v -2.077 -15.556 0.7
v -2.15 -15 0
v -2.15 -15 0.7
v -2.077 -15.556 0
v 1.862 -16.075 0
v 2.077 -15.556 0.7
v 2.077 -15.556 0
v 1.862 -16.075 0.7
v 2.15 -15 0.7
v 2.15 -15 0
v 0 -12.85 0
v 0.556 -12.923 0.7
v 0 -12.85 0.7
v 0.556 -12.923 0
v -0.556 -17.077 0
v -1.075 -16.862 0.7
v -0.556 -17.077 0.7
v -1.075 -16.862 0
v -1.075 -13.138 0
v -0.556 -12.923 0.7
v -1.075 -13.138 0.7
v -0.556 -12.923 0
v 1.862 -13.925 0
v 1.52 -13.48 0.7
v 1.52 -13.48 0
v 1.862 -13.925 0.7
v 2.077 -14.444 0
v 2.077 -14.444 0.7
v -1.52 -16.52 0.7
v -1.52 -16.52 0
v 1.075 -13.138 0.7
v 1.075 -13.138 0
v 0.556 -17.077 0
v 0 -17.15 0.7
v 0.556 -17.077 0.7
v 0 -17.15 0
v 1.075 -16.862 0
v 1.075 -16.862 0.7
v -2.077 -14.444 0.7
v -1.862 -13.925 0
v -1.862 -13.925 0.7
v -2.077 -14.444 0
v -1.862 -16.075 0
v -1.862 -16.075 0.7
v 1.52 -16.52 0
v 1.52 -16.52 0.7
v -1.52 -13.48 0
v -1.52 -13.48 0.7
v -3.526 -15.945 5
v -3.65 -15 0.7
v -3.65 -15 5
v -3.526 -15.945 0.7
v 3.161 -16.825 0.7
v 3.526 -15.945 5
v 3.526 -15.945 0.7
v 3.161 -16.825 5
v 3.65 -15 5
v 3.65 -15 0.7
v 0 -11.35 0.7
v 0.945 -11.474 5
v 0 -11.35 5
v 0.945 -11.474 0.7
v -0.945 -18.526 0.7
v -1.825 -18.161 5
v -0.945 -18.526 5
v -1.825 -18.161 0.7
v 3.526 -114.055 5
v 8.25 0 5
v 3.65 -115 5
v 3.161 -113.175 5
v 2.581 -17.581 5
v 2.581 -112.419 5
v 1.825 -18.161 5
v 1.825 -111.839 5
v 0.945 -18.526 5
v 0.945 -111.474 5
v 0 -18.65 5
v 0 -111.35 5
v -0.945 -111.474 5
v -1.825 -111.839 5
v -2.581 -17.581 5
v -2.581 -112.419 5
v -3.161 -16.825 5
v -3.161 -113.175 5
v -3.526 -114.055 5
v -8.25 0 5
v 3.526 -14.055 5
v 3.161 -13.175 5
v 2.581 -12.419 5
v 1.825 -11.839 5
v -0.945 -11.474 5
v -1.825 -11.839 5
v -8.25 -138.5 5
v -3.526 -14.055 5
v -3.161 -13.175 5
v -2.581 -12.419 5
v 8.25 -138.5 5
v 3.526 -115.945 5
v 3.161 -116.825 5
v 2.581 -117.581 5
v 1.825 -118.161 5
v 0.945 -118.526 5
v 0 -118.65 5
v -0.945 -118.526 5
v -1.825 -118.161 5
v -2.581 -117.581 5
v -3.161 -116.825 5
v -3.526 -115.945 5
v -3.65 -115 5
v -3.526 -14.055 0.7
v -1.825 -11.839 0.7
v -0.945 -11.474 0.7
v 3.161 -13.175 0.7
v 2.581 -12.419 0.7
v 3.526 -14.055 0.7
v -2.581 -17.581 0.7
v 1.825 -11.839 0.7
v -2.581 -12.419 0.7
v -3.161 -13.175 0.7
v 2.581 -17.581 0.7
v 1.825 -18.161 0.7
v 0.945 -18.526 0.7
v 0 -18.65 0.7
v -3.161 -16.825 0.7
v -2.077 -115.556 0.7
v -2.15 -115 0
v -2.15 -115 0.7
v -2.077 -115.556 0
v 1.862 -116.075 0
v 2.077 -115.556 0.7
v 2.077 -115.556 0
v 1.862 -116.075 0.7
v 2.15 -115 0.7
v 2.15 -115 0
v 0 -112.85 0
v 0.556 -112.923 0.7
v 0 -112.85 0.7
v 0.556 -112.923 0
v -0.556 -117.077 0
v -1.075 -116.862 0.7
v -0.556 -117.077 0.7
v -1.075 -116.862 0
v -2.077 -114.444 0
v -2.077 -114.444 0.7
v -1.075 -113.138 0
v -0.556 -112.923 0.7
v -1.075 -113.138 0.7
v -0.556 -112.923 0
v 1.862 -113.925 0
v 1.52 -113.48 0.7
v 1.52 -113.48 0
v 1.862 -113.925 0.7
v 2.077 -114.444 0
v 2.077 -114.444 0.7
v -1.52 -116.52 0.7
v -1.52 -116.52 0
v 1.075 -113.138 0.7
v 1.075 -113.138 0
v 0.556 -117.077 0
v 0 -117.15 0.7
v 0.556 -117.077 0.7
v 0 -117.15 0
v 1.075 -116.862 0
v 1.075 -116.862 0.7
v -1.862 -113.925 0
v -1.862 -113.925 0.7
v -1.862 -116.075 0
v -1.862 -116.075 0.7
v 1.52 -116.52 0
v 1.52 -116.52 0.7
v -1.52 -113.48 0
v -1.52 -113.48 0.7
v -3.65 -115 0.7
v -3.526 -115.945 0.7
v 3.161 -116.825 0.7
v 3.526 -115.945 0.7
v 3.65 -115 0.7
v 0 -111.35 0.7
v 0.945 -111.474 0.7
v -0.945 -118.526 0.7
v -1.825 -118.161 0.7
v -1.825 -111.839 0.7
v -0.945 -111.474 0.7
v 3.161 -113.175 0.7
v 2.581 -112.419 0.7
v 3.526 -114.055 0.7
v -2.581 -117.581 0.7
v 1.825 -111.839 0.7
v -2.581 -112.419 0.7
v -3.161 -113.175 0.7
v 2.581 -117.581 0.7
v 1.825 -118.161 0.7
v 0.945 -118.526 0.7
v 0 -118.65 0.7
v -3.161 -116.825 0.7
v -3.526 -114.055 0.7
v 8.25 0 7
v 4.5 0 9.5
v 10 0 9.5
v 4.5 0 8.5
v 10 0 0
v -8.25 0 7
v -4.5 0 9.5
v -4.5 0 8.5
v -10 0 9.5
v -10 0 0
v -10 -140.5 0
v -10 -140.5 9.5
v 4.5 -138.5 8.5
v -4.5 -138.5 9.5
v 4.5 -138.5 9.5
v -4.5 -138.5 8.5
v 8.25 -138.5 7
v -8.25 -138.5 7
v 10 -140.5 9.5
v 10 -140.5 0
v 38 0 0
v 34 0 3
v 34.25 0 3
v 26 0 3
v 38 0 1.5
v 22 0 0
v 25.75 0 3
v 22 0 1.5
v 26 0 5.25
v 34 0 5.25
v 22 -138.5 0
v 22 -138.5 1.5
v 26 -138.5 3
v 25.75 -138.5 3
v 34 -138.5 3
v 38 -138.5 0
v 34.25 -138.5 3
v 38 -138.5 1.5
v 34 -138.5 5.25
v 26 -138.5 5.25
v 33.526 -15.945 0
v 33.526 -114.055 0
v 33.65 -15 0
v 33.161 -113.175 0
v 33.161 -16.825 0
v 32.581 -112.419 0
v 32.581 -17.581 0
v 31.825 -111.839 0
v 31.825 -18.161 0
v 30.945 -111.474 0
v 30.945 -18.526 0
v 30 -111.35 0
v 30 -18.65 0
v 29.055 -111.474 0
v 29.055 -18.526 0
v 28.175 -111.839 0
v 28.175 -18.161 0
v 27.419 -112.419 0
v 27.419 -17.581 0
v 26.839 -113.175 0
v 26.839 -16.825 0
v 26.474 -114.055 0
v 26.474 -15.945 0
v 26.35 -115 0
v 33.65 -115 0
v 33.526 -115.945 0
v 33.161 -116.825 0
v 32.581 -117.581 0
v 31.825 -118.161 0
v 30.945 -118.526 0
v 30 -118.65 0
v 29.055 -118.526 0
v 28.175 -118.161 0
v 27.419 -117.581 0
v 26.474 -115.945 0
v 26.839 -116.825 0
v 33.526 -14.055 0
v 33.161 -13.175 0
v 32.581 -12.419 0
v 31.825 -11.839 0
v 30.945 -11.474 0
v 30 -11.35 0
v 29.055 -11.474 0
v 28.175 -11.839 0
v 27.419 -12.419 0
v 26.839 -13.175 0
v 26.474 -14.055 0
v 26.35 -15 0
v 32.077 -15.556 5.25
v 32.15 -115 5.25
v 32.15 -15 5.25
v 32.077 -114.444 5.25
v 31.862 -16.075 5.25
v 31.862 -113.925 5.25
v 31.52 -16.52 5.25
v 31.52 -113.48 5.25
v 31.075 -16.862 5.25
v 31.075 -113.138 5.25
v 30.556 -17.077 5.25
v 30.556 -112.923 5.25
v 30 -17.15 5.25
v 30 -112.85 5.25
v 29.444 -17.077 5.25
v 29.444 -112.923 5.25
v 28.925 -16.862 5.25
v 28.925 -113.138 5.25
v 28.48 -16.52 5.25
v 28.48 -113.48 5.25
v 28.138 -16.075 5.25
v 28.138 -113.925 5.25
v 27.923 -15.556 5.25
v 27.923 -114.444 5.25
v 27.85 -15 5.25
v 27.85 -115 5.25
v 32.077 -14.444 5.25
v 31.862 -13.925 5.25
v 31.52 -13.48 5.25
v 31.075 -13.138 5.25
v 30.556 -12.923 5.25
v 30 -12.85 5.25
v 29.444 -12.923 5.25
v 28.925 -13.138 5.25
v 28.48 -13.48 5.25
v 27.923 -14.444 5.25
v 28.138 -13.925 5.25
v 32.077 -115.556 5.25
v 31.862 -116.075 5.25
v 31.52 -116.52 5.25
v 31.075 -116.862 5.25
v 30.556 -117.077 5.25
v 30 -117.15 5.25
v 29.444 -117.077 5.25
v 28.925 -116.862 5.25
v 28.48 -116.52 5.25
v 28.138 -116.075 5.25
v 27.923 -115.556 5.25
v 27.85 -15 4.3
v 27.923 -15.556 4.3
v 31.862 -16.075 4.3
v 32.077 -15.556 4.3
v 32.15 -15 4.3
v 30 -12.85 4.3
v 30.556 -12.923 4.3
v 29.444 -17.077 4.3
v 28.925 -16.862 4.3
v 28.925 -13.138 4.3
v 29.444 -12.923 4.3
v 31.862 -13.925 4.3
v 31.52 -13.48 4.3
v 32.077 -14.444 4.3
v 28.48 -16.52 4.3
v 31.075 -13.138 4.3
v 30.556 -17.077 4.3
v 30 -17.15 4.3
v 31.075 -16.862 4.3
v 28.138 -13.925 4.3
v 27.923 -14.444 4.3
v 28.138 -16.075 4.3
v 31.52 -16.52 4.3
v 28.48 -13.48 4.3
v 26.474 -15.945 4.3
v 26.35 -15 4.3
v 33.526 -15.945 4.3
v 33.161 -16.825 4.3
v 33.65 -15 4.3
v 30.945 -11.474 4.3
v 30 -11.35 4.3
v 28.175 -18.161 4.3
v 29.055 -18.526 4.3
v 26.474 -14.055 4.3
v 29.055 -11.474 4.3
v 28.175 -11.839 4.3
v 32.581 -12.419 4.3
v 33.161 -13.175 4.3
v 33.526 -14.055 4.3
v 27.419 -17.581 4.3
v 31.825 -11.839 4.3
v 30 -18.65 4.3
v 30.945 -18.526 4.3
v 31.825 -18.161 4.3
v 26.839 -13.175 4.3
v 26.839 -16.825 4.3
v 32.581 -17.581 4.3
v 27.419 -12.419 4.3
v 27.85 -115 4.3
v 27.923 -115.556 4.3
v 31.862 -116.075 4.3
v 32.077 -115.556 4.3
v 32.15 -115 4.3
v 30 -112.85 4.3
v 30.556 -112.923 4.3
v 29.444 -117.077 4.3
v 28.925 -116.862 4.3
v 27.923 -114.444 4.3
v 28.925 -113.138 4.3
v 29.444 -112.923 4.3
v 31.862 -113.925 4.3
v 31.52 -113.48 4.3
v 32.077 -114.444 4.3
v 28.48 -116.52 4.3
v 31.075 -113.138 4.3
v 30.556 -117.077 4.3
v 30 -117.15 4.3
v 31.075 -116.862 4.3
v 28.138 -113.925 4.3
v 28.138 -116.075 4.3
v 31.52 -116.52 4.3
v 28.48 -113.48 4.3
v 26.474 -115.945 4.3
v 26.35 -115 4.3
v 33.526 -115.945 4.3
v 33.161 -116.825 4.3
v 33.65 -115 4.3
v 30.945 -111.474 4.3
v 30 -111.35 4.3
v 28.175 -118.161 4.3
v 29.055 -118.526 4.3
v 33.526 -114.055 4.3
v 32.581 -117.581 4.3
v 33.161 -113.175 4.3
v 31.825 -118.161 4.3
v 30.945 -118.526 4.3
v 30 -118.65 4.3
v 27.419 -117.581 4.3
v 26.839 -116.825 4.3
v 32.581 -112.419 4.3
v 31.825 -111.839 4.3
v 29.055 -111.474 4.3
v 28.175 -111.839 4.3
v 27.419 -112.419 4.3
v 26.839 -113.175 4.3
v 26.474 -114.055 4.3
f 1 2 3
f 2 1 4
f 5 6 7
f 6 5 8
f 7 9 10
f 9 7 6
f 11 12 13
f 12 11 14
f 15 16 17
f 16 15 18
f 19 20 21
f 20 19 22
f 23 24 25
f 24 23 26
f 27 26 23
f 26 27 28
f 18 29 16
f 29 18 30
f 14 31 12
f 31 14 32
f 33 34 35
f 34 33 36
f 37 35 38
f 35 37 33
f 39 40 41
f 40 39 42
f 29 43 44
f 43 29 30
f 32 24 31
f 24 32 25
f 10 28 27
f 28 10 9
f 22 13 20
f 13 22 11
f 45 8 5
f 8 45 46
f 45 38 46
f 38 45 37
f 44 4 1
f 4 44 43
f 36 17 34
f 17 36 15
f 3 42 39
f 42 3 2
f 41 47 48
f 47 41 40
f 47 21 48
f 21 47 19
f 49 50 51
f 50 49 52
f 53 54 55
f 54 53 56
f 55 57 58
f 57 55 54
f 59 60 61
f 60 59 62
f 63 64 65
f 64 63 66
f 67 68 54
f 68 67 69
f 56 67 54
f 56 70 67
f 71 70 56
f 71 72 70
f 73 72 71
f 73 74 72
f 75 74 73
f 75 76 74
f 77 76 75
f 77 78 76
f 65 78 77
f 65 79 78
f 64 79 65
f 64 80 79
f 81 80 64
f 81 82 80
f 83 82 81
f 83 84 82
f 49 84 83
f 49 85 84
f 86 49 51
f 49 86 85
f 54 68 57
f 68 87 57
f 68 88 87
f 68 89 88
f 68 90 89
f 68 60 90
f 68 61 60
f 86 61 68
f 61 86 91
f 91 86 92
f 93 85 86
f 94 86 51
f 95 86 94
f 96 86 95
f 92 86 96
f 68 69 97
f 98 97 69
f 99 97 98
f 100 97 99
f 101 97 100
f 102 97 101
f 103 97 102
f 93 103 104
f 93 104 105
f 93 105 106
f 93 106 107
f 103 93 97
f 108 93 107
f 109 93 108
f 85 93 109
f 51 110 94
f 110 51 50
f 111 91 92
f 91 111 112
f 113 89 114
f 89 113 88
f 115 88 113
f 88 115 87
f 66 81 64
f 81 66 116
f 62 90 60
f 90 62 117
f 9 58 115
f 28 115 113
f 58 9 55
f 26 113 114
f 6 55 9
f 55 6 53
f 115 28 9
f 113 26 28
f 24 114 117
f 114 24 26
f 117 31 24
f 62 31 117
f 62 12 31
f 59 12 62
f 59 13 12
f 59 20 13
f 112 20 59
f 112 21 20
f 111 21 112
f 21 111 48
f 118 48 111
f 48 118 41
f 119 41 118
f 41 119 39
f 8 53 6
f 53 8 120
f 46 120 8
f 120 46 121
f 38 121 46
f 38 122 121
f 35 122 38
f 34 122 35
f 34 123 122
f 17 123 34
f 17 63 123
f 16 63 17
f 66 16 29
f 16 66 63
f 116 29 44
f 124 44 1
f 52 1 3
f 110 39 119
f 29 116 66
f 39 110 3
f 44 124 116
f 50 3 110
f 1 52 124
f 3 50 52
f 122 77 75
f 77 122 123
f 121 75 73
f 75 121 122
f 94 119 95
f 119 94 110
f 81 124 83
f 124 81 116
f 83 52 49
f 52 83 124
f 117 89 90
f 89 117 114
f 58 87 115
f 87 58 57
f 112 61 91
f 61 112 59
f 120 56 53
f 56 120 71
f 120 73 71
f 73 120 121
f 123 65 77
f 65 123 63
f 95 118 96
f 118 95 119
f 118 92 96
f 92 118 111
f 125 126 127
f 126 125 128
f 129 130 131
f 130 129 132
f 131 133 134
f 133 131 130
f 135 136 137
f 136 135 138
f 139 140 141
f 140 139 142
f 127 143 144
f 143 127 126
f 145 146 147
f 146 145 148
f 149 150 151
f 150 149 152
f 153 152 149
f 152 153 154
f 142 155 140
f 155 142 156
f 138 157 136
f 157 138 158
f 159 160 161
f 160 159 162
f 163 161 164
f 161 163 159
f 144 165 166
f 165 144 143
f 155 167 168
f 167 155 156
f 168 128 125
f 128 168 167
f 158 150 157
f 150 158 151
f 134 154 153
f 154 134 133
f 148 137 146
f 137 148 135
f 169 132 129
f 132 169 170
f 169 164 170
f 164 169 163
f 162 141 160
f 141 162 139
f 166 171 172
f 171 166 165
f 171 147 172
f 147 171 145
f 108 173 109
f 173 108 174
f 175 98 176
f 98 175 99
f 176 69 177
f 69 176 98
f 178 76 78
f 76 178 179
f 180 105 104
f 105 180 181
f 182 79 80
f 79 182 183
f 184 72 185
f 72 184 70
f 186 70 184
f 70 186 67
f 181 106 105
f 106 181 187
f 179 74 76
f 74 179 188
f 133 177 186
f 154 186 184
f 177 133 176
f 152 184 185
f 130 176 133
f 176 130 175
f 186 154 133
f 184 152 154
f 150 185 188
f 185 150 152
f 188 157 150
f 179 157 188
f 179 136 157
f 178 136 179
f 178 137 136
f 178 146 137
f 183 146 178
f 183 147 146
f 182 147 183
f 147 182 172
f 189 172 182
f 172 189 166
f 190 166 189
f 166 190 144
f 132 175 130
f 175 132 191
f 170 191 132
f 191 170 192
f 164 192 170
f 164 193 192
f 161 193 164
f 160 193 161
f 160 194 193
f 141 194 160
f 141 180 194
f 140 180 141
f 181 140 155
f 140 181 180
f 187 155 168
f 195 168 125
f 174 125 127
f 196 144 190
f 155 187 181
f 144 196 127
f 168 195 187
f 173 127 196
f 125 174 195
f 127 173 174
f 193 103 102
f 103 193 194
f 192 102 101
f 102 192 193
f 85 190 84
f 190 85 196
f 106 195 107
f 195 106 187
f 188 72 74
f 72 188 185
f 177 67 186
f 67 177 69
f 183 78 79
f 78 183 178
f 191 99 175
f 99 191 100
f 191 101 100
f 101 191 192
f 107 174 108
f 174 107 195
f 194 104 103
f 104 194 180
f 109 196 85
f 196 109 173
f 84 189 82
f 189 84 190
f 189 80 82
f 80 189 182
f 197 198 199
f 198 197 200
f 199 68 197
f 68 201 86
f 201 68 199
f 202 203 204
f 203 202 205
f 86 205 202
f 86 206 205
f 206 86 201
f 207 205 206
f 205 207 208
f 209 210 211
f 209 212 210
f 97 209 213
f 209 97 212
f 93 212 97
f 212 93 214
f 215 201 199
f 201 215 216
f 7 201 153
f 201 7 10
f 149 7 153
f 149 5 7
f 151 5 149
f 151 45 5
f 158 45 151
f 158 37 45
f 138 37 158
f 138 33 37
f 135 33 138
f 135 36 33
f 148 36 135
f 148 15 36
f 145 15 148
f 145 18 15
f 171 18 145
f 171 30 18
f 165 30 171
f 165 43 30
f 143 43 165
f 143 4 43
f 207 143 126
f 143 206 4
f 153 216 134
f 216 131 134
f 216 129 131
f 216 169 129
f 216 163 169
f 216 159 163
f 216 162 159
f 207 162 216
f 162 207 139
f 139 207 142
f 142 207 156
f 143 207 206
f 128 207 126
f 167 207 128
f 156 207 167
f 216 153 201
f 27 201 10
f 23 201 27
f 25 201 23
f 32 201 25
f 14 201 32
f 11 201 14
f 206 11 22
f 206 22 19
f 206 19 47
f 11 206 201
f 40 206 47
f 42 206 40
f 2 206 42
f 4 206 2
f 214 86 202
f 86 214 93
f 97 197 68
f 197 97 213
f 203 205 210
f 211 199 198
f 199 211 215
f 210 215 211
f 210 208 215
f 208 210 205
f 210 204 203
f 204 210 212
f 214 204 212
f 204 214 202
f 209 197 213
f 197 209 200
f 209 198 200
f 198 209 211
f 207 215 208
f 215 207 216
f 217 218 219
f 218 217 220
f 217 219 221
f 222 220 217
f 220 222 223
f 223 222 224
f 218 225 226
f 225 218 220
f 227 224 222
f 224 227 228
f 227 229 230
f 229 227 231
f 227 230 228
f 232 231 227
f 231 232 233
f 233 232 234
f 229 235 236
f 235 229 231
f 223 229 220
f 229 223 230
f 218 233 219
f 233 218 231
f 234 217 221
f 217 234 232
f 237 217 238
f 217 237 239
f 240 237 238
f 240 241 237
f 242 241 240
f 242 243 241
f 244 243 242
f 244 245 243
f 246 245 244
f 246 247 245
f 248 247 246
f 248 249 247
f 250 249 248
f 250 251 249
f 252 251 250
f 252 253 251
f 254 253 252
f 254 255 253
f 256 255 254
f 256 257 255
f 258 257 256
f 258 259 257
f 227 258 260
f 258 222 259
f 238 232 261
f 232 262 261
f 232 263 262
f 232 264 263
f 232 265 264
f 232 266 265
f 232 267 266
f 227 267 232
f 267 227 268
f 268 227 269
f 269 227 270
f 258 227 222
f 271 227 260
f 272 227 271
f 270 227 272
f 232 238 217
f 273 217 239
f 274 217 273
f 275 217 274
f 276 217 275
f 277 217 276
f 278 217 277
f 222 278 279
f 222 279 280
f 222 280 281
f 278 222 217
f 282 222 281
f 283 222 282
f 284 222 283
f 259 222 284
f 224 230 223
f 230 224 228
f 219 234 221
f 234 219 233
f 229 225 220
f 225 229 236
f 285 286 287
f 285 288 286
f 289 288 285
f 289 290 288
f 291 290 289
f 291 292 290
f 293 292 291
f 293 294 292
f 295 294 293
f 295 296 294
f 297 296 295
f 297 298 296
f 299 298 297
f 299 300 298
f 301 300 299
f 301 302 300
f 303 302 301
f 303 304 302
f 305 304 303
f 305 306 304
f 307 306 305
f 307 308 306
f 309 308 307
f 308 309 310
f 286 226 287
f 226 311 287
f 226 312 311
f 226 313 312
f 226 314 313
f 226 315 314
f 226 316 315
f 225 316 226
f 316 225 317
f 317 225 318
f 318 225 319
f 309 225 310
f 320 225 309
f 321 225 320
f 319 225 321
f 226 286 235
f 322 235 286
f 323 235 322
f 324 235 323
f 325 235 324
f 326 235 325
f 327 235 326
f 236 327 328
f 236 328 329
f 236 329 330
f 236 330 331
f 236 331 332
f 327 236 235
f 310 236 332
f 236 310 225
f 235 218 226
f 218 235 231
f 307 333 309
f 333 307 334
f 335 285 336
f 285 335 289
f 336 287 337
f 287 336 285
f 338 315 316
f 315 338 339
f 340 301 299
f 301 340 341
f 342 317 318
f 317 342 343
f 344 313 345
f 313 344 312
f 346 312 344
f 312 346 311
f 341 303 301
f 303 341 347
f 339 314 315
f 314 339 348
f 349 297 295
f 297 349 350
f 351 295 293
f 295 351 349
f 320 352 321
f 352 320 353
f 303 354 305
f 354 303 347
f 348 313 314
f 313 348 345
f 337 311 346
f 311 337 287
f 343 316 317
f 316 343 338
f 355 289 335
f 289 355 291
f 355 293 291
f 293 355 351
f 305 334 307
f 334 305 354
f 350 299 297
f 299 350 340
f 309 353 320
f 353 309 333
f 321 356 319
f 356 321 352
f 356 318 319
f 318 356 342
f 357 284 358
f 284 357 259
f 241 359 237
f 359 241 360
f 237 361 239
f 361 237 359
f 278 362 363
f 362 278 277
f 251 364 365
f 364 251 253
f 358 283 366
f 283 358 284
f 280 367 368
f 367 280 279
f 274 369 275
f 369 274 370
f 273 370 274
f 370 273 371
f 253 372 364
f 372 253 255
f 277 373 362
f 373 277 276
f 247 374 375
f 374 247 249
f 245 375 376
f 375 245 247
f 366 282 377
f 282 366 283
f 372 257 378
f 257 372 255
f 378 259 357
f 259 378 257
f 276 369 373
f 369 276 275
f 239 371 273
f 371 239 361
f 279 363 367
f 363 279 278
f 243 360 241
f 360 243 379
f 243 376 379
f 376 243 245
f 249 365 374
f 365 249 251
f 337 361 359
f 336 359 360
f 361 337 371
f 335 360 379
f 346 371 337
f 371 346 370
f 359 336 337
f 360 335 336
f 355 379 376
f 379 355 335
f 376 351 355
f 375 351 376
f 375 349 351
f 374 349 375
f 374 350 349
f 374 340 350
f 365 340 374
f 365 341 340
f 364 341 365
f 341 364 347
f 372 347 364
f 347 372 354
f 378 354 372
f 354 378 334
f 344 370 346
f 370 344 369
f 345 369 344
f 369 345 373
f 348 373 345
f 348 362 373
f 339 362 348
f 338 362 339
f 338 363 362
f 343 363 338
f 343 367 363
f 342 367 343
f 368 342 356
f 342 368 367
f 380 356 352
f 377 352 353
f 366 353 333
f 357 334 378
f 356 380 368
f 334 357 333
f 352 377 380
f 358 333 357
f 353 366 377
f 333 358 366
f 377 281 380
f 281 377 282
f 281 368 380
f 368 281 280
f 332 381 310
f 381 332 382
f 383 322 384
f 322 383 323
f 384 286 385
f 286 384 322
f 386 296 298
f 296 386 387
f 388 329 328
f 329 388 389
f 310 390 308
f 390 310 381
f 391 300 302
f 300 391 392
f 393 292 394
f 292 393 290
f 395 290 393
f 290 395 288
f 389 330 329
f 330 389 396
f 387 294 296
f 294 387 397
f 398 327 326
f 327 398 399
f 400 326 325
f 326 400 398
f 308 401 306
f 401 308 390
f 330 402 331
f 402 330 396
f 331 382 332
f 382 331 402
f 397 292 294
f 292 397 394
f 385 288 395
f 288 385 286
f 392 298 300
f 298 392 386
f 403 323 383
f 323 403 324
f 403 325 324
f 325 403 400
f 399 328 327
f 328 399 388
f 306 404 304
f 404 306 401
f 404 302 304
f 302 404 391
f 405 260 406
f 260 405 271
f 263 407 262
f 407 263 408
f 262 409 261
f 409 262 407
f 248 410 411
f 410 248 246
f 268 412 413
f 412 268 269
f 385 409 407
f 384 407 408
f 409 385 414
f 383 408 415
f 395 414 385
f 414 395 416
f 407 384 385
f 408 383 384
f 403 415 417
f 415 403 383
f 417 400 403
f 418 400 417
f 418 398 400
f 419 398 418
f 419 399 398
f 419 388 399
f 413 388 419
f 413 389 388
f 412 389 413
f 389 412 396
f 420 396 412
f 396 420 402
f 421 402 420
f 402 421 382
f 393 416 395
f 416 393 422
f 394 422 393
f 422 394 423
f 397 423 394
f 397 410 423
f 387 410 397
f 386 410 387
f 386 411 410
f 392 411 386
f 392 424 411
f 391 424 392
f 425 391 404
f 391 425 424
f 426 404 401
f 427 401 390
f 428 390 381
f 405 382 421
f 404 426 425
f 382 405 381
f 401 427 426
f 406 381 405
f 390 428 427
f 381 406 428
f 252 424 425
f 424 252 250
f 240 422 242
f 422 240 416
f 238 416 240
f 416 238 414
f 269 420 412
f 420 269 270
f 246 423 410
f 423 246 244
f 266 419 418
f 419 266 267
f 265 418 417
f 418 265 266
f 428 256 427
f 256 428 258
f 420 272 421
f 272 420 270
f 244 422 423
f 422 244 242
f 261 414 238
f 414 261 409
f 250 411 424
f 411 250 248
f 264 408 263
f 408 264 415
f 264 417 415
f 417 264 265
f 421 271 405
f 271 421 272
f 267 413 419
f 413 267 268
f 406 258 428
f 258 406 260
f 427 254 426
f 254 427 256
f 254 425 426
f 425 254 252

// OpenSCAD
// Rails for Optimus Control Box 3D printer assembly (delta configuration)

/**********************/
/*    Parameters      */
/**********************/

Test_Mode = false;  // use Test_Mode true to print a short rail for testing

Length = Test_Mode ? 20 : 138.5; // this length should fit the optimus control box
Width = 20; // the outer width of the rail
Width_Inner = 16; // the inner width of the rail
Height_Base = 5;
Height_Rail_Base = 3;
Height_Rail_Upper = 2.5;
Distance = 30; // distance between parts

Hole_Tolerance = 0.3; // 0.3 should work fine for the holes to fit the screws
Slide_Tolerance = 0.5; // try slide tolerance values between 0.1 and 0.8, depending on your printer settings and material used
Bevel_Distance = 2; // a larger value means a lower angle

/**********************/
/*     Variables      */
/**********************/

Rail_Length = Length;
Rail_Base_Width = Width_Inner;
Rail_Base_Height = Height_Rail_Base;
Rail_Base_Bevel_Distance = Bevel_Distance;
Rail_Upper_Width = 8;
Rail_Upper_Height = Height_Rail_Upper;
Rail_Height = Rail_Base_Height + Rail_Upper_Height;

Slide_Move = 0;
Slide_Length = Length;
Slide_Width = Width;
Slide_Base_Height = Height_Base;
Slide_Space_Height = Rail_Base_Height + Slide_Tolerance;
Slide_Space_Wall_Width = (Width - Rail_Base_Width - Slide_Tolerance) / 2;
Slide_Space_Width = Slide_Width - 2 * Slide_Space_Wall_Width;
Slide_Overhang_Height = 1;
Slide_Overhang_Bevel_Distance = Bevel_Distance; //distance between base and bottom corner of the bevel
Slide_Overhang_Width = (Slide_Width - Rail_Upper_Width)/ 2 - Slide_Tolerance;
Slide_Height = Slide_Base_Height + Slide_Space_Height + Slide_Overhang_Height;
Slide_Stop_Thickness = 2;

Hole_Diameter = 4 + Hole_Tolerance;
Hole_Distance = 100;
Hole_Start_Distance = 15;
Hole_Buffer = 5;
Hole_Lowering_Diameter = 7 + Hole_Tolerance;
Hole_Lowering_Height = 4 + Hole_Tolerance;

/**********************/
/*    Code Start      */
/**********************/

Slide();
Rail();

/**********************/
/*       SLIDE        */
/**********************/

module Slide() {
    color("red") {
        translate([Slide_Move, 0, 0])
            union() {
                translate([0, 0, Slide_Base_Height / 2])
                    rotate([90,0,0])
                        SlideBase();
                translate([0, 0, Slide_Base_Height + Slide_Space_Height / 2])
                    rotate([90,0,0])
                        SlideSpacePart();
                translate([0, 0, Slide_Base_Height + Slide_Space_Height + Slide_Overhang_Height / 2])
                    rotate([90,0,0])
                        SlideOverhangPart();
                translate([0, -Slide_Length, Slide_Height / 2])
                    rotate([90,0,0])
                        SlideStop();
            }
    }
}

module SlideBase() {
    difference() {
        SlideBaseBlock();
        SlideBaseHoles();
    }
}

module SlideBaseBlock() {
    linear_extrude(height = Slide_Length)
        square([Slide_Width, Slide_Base_Height], center = true);
}

module SlideBaseHoles() {
    union() {
        translate([0, Slide_Base_Height / 2, 0]) {
            translate([0, 0, Hole_Start_Distance])
                Hole(Slide_Base_Height);
            translate([0, -Hole_Lowering_Height / 2, Hole_Start_Distance])
                #HoleLowering();
            translate([0, 0, Hole_Start_Distance + Hole_Distance])
                Hole(Slide_Base_Height);
            translate([0, -Hole_Lowering_Height / 2, Hole_Start_Distance + Hole_Distance])
                HoleLowering();
        }
    }
}

module SlideSpacePart() {
    union() {
        translate([-(Slide_Width - Slide_Space_Wall_Width) / 2, 0, 0])
            SlideSpaceWall();
        translate([(Slide_Width - Slide_Space_Wall_Width) / 2, 0, 0])
            SlideSpaceWall();
    }
}

module SlideSpaceWall() {
    linear_extrude(height = Slide_Length)
        square([Slide_Space_Wall_Width, Slide_Space_Height], center = true);
}

module SlideOverhangPart() {
    union() {
        translate([-(Slide_Width - Slide_Overhang_Width) / 2, 0, 0])
            SlideOverhang();
        translate([-Slide_Width / 2 +  Slide_Space_Wall_Width, 0, 0])
            SlideOverhangBevel();
        translate([Slide_Width / 2 -  Slide_Space_Wall_Width, 0, 0])
            mirror([1,0,0])
                SlideOverhangBevel();
        translate([(Slide_Width - Slide_Overhang_Width) / 2, 0, 0])
            SlideOverhang();
    }
}

module SlideOverhang() {
    linear_extrude(height = Slide_Length)
        square([Slide_Overhang_Width, Slide_Overhang_Height], center = true);
}

module SlideOverhangBevel() {
    linear_extrude(height = Slide_Length)
        polygon(points = [
            [0, -Slide_Overhang_Height / 2], // upper left
            [Slide_Overhang_Width - Slide_Space_Wall_Width, -Slide_Overhang_Height / 2], // upper right
            [0, -Slide_Overhang_Height / 2 - Slide_Space_Height + Slide_Overhang_Bevel_Distance] // lower left
        ], paths = [ 
            [0, 1, 2]
        ]);
}

module SlideStop() {
    linear_extrude(height = Slide_Stop_Thickness)
        square([Slide_Width, Slide_Height], center = true);
}


/**********************/
/*        RAIL        */
/**********************/

module Rail() {
    translate([Distance, 0, 0])
        rotate([90,0,0])
            difference() {
                RailBody();
                RailHoles();
            }
}

module RailBody() {
    union() {
        translate([0, Rail_Base_Height / 2, 0])
            RailBase();
        translate([0, Rail_Base_Height / 2 + Rail_Upper_Height, 0])
            RailUpperPart();
    }
}

module RailBase() {
    difference() {
        translate([0, 0, 0])
            RailBaseBlock();
        translate([-Rail_Base_Width / 2, Rail_Base_Height / 2, 0])
            RailBaseBevel();
        translate([Rail_Base_Width / 2, Rail_Base_Height / 2, 0])
            mirror([1,0,0])
                RailBaseBevel();
    }
}

module RailBaseBlock() {
    linear_extrude(height = Rail_Length)
        square([Rail_Base_Width, Rail_Base_Height], center = true);
}

module RailBaseBevel() {
    linear_extrude(height = Slide_Length)
        polygon(points = [
            [0, 0], // upper left
            [Slide_Overhang_Width - Slide_Space_Wall_Width, 0], // upper right
            [0, -Slide_Space_Height + Slide_Overhang_Bevel_Distance] // lower left
        ], paths = [ 
            [0, 1, 2]
        ]);
}

module RailUpperPart() {
    translate([0, 0, 0])
        linear_extrude(height = Rail_Length)
            square([Rail_Upper_Width, Rail_Upper_Height], center = true);
}

module RailHoles() {
    union() {
        translate([0, 0, 0]) {
            translate([0, 0, Hole_Start_Distance])
                Hole(Slide_Base_Height);
            translate([0, Hole_Lowering_Height / 2, Hole_Start_Distance])
                #HoleLowering();
            translate([0, 0, Hole_Start_Distance + Hole_Distance])
                Hole(Slide_Base_Height);
            translate([0, Hole_Lowering_Height / 2, Hole_Start_Distance + Hole_Distance])
                HoleLowering();
        }
    }
}

/**********************/
/*       Holes        */
/**********************/

module Hole(height) {
    rotate([90, 0, 0]) {
        cylinder(h=height+Hole_Buffer*2, d=Hole_Diameter, center=true, $fn=24);
    }
}

module HoleLowering() {
    rotate([90, 0, 0]) {
        cylinder(h=Hole_Lowering_Height, d=Hole_Lowering_Diameter, center=true, $fn=24);
    }
}
